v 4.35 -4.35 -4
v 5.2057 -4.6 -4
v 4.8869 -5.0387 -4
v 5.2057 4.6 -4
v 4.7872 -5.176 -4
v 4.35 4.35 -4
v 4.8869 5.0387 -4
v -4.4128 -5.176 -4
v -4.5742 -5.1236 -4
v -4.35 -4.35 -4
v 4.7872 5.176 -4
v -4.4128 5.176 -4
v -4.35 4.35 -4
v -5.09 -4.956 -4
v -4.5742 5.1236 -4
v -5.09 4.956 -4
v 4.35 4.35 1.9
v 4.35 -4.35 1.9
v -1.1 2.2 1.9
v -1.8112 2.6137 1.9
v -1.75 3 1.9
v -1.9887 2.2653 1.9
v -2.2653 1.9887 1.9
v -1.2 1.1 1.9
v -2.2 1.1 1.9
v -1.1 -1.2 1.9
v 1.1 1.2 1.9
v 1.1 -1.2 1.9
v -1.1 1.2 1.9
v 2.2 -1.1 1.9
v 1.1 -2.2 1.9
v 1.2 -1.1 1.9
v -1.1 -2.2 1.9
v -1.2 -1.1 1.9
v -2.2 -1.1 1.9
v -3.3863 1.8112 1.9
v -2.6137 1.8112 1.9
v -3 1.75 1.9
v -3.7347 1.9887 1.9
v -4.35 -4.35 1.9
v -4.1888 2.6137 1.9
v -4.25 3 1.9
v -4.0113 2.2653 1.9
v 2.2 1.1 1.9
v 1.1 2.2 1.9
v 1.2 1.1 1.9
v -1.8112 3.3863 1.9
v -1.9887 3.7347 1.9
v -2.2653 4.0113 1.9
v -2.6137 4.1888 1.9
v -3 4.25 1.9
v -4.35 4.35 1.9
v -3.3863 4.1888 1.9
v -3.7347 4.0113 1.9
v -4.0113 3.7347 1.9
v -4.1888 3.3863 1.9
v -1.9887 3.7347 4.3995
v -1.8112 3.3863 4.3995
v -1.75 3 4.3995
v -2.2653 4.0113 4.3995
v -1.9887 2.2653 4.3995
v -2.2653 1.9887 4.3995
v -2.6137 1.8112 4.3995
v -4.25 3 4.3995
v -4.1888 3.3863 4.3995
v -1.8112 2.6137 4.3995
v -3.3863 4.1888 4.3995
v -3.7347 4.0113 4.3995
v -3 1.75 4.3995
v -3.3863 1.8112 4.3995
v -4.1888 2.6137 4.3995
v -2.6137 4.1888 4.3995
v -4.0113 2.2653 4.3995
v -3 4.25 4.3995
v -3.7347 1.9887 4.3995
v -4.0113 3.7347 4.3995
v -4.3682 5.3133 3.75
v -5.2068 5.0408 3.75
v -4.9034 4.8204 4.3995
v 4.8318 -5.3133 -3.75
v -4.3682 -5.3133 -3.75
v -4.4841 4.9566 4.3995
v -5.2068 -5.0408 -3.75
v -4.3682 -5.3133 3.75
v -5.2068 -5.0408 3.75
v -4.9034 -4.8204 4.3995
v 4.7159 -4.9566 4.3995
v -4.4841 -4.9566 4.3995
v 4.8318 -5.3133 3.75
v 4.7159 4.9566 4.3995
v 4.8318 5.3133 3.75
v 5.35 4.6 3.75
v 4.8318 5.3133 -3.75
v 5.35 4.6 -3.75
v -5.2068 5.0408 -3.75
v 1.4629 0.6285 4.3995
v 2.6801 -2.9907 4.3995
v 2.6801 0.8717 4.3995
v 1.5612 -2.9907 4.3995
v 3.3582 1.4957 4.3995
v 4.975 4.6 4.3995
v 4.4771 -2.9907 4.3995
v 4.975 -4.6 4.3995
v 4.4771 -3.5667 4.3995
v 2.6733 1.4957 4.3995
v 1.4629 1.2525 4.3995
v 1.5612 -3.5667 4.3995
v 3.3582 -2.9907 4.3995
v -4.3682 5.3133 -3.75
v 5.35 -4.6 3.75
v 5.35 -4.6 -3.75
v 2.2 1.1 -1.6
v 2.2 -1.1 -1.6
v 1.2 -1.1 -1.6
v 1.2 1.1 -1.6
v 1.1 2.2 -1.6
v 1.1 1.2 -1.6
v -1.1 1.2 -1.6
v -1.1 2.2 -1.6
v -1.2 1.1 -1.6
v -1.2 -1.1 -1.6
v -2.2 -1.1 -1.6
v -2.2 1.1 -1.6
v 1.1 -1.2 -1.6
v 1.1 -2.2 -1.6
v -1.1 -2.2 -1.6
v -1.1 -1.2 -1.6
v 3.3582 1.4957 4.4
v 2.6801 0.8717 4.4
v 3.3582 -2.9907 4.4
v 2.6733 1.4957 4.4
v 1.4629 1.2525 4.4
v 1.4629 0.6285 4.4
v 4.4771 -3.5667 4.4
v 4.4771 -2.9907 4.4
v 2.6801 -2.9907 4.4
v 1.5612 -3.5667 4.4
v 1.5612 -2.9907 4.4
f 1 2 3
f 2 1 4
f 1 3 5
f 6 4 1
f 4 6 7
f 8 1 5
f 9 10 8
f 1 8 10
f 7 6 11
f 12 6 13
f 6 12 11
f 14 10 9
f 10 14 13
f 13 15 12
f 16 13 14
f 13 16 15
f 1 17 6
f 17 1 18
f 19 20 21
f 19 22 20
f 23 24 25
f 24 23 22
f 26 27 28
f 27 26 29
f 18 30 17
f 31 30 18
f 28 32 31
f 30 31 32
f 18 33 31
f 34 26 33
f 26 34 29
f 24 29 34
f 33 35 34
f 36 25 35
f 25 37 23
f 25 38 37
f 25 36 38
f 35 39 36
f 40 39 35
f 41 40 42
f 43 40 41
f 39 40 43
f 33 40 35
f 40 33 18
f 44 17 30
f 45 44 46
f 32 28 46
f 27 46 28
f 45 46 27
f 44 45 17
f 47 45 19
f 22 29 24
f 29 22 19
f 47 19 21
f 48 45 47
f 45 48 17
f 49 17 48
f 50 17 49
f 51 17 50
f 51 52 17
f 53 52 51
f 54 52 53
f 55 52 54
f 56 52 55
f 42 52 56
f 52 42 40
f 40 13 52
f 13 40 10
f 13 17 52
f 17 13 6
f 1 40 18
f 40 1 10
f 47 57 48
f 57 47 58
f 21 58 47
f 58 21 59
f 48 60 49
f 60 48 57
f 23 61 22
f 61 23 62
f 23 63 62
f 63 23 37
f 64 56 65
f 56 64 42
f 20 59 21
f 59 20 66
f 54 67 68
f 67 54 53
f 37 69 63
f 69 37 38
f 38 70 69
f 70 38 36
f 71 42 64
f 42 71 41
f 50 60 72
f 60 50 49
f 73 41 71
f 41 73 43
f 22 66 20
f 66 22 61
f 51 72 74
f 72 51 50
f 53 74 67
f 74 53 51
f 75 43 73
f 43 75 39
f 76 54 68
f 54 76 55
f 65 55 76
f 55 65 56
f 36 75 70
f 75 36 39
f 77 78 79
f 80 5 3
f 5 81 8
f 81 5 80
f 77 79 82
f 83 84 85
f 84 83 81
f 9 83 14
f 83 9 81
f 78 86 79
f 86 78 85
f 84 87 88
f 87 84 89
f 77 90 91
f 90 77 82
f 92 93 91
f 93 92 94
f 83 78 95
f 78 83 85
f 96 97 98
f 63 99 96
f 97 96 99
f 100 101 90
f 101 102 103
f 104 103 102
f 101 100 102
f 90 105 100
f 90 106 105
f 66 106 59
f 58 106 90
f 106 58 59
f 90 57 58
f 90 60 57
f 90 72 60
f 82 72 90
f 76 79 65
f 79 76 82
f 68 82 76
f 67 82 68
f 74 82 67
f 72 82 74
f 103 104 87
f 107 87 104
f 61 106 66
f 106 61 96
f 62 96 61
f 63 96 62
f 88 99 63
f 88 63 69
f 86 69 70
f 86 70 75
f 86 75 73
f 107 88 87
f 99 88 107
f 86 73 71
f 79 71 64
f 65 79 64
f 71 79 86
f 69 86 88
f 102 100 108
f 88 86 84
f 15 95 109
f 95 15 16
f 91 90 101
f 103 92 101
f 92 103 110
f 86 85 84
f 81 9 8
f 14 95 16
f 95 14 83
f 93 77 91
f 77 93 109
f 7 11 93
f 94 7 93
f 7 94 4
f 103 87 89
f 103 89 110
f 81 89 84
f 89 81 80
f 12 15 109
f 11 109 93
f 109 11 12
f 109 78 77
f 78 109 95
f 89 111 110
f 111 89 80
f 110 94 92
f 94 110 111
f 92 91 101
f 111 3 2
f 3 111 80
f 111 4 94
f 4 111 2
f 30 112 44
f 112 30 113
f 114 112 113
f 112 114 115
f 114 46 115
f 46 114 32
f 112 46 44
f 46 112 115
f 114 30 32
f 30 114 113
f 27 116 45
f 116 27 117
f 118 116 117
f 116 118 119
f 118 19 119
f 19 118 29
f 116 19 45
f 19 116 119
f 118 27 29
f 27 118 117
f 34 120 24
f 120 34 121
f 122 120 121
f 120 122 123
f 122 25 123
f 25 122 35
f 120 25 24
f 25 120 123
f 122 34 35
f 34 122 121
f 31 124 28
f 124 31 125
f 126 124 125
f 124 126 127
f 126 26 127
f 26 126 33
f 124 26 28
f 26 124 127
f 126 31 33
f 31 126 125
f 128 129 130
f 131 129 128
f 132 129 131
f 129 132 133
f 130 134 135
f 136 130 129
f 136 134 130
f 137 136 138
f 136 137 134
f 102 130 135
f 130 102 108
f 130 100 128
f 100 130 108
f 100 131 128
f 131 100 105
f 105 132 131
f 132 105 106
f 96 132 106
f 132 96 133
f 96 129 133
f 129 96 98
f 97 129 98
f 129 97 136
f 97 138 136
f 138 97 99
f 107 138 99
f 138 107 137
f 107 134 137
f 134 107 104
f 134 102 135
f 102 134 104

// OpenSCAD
// Definition size of housing
// **************************

width      = 10.7;    
depth      = 10.7;     
height     = 4.5;
recess     = 2.4;
rim        = 1;
legend  = "1";

radius     = 1.2;            
act_x      = 2.4;
act_y      = 2.4;
act_z      = 4;

act_clip_w=1;

//Definition of circle angular resolution
resol        = 36;           // Identical to housing !!!


difference () {

   // Construction Main Cover
   union () {
      difference () {
         // Cap
            roundedcube ( [width, depth, height*2],center = true, radius );

         // Remove back side
         union () {
          translate ( [0,0, -height/2-4] ){
            cube ( [width+1, depth+1, height], center = true );
         };
          translate ( [0,0, recess/2 -3.7] ){
            cube ( [width-2*rim, depth-2*rim, 2* recess+4], center = true );
         };
         
         //led hole
          translate ( [-3,3, recess/2 -3.7] ){
            cylinder ( h=20, r=1.25, center = true, $fn=20 );
         };
     };
     };
      
    translate ( [act_x/2+act_clip_w/2,0, recess-act_z/2] ){
            cube ( [act_clip_w, act_y-0.2, act_z], center = true );
         };

    translate ( [0,act_y/2+act_clip_w/2, recess-act_z/2] ){
            cube ( [act_x-0.2, act_clip_w, act_z], center = true );
         };

    translate ( [-(act_x/2+act_clip_w/2),0, recess -act_z/2] ){
            cube ( [act_clip_w, act_y-0.2, act_z], center = true );
         };

    translate ( [0,-(act_y/2+act_clip_w/2),recess -act_z/2] ){
            cube ( [act_x-0.2, act_clip_w, act_z], center = true );
         };

    translate ( [0.7,-depth/3,height-0.5] ){
        color("#FF0000") linear_extrude(height = 0.4) {
         text(legend, size=5, font="Swis721 Blk BT:style=Black" );
         };
     };

    /*translate ( [-1.3,2,height-0.3] ){
        color("#FF0000") cube ( [5.5,3, 0.4], center = true );
     };*/

     
   };

   // Space for Breakouts, holes, ...


};

module roundedcube(size = [1, 1, 1], center = false, radius = 0.75, apply_to = "all") {
	// If single value, convert to [x, y, z] vector
	size = (size[0] == undef) ? [size, size, size] : size;

	translate_min = radius;
	translate_xmax = size[0] - radius;
	translate_ymax = size[1] - radius;
	translate_zmax = size[2] - radius;

	diameter = radius * 2;

	obj_translate = (center == false) ?
		[0, 0, 0] : [
			-(size[0] / 2),
			-(size[1] / 2),
			-(size[2] / 2)
		];

	translate(v = obj_translate) {
		hull() {
			for (translate_x = [translate_min, translate_xmax]) {
				x_at = (translate_x == translate_min) ? "min" : "max";
				for (translate_y = [translate_min, translate_ymax]) {
					y_at = (translate_y == translate_min) ? "min" : "max";
					for (translate_z = [translate_min, translate_zmax]) {
						z_at = (translate_z == translate_min) ? "min" : "max";

						translate(v = [translate_x, translate_y, translate_z])
						if (
							(apply_to == "all") ||
							(apply_to == "xmin" && x_at == "min") || (apply_to == "xmax" && x_at == "max") ||
							(apply_to == "ymin" && y_at == "min") || (apply_to == "ymax" && y_at == "max") ||
							(apply_to == "zmin" && z_at == "min") || (apply_to == "zmax" && z_at == "max")
						) {
							sphere(r = radius);
						} else {
							rotate = 
								(apply_to == "xmin" || apply_to == "xmax" || apply_to == "x") ? [0, 90, 0] : (
								(apply_to == "ymin" || apply_to == "ymax" || apply_to == "y") ? [90, 90, 0] :
								[0, 0, 0]
							);
							rotate(a = rotate)
							cylinder(h = diameter, r = radius, center = true);
						}
					}
				}
			}
		}
	}
}
